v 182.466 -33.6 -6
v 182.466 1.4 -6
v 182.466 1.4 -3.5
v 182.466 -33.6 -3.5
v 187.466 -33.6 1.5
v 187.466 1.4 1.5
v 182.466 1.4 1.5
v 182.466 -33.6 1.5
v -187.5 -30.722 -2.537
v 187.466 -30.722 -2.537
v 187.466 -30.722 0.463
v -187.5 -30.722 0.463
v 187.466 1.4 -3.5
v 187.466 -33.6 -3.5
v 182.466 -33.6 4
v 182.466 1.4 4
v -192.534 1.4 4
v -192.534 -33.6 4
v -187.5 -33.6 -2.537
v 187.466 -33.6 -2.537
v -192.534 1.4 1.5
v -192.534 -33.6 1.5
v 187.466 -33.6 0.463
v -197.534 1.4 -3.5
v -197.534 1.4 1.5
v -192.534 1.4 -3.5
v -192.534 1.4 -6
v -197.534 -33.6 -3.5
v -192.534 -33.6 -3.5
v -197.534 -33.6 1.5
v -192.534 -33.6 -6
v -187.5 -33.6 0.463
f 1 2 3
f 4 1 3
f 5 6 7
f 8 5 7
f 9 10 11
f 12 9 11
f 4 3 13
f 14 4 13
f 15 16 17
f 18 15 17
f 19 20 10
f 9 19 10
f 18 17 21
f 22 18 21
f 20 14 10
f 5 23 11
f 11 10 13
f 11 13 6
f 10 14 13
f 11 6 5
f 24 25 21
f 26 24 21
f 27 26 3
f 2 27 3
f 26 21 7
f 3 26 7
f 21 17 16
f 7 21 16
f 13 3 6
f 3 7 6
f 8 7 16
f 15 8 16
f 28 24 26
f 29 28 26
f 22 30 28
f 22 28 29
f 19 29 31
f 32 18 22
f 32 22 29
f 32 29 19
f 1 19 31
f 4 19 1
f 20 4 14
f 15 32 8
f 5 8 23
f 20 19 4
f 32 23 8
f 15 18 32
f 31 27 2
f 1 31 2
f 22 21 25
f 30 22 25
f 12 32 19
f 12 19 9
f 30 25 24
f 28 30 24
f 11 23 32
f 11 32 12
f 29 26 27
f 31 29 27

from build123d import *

# Parameters (mm, degrees)
F1_DEPTH      = 35
F2_W          = 3
F2_H          = 3
F3_DEPTH      = 187.5
F3_DEPTH_BACK = 187.5


with BuildPart() as f1:
    # F0 (on Front) → F1 (new body)
    with BuildSketch(Plane.XZ):
        Polygon((-226.934456, 2.5), (-226.934456, 0), (-226.934456, -2.5), (-221.934456, -2.5), (-221.934456, -5), (153.065544, -5), (153.065544, -2.5), (158.065544, -2.5), (158.065544, 2.5), (153.065544, 2.5), (153.065544, 5), (-221.934456, 5), (-221.934456, 2.5), align=None)
    extrude(amount=F1_DEPTH)


with BuildPart() as f3:
    # F2 (on Right) → F3 (new body, two sides)
    with BuildSketch(Plane.YZ) as f3_sk:
        with Locations((-32.222062, -1.036781)):
            Rectangle(F2_W, F2_H)
    extrude(amount=F3_DEPTH)
    extrude(f3_sk.sketch, amount=-F3_DEPTH_BACK)


with BuildPart() as f1_1:
    # F4: moved
    add(f1.part.moved(Location((29.4, 1.4, -1))))

    # F5: cut F3
    add(f3.part, mode=Mode.SUBTRACT)


solid = f1_1.part
